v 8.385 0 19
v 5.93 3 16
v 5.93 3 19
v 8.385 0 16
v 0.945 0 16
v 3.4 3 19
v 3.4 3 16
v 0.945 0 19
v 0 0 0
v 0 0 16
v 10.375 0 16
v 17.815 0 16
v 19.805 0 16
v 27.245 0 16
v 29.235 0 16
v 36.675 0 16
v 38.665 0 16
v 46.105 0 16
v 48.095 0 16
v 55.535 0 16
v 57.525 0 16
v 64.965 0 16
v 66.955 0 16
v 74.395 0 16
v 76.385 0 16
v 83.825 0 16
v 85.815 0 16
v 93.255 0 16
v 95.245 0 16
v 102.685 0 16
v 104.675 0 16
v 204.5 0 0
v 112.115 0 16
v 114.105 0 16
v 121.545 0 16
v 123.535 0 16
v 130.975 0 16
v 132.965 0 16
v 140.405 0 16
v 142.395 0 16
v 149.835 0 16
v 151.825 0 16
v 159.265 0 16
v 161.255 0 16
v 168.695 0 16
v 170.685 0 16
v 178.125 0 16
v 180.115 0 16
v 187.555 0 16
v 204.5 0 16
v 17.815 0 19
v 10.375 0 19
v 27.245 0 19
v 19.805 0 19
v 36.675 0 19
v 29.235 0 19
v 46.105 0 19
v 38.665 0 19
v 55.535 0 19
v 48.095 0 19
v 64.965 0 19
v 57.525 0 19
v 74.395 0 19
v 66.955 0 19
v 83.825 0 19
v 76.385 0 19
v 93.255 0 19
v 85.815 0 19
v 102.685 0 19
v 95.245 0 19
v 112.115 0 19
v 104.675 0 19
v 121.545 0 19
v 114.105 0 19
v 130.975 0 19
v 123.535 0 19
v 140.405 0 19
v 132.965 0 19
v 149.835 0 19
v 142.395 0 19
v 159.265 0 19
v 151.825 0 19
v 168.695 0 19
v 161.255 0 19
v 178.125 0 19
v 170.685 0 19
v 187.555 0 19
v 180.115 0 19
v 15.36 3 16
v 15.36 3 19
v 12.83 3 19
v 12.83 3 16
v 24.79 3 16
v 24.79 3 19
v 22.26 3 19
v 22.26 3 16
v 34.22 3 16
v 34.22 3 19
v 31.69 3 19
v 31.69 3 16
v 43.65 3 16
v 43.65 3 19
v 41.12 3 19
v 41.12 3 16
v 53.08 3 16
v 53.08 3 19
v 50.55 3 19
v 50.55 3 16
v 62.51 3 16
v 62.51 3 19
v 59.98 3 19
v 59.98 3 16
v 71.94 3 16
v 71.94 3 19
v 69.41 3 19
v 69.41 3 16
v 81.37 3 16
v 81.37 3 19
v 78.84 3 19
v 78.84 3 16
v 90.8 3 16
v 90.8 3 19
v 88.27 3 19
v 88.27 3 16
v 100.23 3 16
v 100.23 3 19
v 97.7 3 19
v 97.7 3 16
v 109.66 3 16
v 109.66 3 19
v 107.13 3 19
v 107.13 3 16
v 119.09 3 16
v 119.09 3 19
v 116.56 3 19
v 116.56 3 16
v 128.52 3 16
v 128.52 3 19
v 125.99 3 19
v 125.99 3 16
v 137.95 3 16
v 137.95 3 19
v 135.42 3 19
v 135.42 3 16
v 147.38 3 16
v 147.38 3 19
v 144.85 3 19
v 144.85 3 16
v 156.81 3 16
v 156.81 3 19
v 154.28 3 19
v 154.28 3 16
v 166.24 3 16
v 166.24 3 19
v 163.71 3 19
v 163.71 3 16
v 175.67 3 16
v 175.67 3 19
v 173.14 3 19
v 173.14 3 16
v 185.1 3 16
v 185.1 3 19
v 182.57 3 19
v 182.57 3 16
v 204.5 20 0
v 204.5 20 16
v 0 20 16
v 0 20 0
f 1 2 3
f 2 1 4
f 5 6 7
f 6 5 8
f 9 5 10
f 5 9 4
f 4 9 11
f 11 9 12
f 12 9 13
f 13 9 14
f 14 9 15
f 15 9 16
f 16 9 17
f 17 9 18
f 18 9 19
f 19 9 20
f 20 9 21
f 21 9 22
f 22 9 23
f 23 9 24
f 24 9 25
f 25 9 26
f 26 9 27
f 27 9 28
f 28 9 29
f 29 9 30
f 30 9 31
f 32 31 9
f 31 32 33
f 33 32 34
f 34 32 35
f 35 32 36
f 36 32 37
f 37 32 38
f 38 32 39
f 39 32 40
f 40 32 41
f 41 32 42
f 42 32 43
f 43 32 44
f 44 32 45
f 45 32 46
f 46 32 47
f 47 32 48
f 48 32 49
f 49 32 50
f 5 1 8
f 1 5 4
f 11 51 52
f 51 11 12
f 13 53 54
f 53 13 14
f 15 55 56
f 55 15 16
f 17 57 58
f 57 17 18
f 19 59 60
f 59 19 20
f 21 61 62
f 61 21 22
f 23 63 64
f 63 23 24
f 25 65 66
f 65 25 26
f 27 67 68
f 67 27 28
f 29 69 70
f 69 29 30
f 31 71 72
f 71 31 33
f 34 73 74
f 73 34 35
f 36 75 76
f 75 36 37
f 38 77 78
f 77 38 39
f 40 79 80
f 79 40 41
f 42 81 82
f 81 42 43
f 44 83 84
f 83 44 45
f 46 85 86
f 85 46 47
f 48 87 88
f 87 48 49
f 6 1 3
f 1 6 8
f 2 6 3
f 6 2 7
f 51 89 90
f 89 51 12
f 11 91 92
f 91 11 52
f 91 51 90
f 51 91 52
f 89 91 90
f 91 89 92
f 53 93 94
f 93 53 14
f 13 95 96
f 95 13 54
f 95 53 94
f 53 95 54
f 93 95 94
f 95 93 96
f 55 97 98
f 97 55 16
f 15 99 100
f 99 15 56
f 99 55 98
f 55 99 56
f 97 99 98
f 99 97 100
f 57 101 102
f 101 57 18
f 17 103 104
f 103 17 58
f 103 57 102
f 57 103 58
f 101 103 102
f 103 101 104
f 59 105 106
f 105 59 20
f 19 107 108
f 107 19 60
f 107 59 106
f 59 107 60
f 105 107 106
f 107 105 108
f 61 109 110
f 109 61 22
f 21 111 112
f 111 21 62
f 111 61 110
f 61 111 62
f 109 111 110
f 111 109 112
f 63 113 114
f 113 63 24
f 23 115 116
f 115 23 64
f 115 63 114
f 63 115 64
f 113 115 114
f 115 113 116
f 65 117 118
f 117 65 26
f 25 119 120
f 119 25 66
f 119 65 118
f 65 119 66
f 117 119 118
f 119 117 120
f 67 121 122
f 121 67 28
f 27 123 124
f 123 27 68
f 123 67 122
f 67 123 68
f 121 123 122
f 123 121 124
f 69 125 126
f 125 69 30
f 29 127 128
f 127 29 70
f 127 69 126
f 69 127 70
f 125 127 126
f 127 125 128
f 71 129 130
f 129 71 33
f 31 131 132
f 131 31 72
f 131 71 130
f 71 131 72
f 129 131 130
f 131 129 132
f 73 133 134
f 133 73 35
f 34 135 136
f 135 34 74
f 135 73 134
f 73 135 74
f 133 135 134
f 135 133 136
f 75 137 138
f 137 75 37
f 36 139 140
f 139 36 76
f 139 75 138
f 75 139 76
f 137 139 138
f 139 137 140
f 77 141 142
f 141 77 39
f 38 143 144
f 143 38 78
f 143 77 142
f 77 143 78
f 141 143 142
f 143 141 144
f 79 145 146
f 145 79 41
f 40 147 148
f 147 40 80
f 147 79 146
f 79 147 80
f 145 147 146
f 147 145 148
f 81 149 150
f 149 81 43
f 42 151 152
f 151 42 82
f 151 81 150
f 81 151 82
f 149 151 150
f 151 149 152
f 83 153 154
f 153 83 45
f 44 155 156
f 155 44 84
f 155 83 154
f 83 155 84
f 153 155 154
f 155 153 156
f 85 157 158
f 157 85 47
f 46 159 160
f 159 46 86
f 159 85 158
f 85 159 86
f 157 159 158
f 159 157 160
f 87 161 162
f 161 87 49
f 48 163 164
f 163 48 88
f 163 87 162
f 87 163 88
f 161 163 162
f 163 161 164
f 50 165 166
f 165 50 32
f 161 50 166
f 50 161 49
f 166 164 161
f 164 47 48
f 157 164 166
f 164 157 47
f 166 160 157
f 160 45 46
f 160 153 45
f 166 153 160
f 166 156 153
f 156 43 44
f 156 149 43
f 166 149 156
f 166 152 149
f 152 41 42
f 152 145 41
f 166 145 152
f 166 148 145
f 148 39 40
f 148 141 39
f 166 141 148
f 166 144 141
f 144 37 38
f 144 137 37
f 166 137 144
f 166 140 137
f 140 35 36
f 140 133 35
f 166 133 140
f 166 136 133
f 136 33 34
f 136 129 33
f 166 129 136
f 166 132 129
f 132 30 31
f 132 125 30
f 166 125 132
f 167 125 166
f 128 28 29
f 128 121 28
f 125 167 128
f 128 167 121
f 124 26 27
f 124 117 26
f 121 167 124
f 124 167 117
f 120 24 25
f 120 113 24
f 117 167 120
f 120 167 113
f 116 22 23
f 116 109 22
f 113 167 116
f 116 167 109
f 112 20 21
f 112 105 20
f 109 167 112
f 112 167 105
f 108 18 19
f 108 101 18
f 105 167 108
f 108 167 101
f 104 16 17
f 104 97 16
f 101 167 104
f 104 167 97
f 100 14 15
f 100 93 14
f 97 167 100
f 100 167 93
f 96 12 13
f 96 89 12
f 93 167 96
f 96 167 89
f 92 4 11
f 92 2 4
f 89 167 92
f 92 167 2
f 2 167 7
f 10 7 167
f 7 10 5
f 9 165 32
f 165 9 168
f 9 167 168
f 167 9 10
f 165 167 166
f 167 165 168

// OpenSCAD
$fn = 32;

// ----------------------------------------------------------------------
// Gear rack: m=3 z=20, 204.5 x 20 x 19 mm
// ----------------------------------------------------------------------

// --- parameters (mm) ---
rack_len = 204.5;         // rack length, X
rack_w = 20;              // rack width, Y
rack_h = 19;              // overall height, Z
modul = 3;                // module
body_t = 16;              // tooth root line height
pitch = 9.43;             // circular pitch
tip_w = 2.53;             // tooth thickness at the tip
root_w = 7.44;            // tooth thickness at the root line
sink = 0.6;               // tooth root overlap into the body

tooth_span = 188.5;

module tooth(x0) {
  /* 20 deg flank profile, sunk into the body for a positive overlap */
  translate([x0, 0, body_t - sink])
    linear_extrude(height = rack_h - body_t + sink)
      polygon(points = [[-root_w / 2, 0], [root_w / 2, 0],
                        [tip_w / 2, rack_h - body_t],
                        [-tip_w / 2, rack_h - body_t]]);
}

difference() {
  union() {
    cube([rack_len, rack_w, body_t]);
    for (i = [0 : 20 - 1])
      tooth((i + 0.5) * pitch + (tooth_span - 20 * pitch) / 2);
  }
}
